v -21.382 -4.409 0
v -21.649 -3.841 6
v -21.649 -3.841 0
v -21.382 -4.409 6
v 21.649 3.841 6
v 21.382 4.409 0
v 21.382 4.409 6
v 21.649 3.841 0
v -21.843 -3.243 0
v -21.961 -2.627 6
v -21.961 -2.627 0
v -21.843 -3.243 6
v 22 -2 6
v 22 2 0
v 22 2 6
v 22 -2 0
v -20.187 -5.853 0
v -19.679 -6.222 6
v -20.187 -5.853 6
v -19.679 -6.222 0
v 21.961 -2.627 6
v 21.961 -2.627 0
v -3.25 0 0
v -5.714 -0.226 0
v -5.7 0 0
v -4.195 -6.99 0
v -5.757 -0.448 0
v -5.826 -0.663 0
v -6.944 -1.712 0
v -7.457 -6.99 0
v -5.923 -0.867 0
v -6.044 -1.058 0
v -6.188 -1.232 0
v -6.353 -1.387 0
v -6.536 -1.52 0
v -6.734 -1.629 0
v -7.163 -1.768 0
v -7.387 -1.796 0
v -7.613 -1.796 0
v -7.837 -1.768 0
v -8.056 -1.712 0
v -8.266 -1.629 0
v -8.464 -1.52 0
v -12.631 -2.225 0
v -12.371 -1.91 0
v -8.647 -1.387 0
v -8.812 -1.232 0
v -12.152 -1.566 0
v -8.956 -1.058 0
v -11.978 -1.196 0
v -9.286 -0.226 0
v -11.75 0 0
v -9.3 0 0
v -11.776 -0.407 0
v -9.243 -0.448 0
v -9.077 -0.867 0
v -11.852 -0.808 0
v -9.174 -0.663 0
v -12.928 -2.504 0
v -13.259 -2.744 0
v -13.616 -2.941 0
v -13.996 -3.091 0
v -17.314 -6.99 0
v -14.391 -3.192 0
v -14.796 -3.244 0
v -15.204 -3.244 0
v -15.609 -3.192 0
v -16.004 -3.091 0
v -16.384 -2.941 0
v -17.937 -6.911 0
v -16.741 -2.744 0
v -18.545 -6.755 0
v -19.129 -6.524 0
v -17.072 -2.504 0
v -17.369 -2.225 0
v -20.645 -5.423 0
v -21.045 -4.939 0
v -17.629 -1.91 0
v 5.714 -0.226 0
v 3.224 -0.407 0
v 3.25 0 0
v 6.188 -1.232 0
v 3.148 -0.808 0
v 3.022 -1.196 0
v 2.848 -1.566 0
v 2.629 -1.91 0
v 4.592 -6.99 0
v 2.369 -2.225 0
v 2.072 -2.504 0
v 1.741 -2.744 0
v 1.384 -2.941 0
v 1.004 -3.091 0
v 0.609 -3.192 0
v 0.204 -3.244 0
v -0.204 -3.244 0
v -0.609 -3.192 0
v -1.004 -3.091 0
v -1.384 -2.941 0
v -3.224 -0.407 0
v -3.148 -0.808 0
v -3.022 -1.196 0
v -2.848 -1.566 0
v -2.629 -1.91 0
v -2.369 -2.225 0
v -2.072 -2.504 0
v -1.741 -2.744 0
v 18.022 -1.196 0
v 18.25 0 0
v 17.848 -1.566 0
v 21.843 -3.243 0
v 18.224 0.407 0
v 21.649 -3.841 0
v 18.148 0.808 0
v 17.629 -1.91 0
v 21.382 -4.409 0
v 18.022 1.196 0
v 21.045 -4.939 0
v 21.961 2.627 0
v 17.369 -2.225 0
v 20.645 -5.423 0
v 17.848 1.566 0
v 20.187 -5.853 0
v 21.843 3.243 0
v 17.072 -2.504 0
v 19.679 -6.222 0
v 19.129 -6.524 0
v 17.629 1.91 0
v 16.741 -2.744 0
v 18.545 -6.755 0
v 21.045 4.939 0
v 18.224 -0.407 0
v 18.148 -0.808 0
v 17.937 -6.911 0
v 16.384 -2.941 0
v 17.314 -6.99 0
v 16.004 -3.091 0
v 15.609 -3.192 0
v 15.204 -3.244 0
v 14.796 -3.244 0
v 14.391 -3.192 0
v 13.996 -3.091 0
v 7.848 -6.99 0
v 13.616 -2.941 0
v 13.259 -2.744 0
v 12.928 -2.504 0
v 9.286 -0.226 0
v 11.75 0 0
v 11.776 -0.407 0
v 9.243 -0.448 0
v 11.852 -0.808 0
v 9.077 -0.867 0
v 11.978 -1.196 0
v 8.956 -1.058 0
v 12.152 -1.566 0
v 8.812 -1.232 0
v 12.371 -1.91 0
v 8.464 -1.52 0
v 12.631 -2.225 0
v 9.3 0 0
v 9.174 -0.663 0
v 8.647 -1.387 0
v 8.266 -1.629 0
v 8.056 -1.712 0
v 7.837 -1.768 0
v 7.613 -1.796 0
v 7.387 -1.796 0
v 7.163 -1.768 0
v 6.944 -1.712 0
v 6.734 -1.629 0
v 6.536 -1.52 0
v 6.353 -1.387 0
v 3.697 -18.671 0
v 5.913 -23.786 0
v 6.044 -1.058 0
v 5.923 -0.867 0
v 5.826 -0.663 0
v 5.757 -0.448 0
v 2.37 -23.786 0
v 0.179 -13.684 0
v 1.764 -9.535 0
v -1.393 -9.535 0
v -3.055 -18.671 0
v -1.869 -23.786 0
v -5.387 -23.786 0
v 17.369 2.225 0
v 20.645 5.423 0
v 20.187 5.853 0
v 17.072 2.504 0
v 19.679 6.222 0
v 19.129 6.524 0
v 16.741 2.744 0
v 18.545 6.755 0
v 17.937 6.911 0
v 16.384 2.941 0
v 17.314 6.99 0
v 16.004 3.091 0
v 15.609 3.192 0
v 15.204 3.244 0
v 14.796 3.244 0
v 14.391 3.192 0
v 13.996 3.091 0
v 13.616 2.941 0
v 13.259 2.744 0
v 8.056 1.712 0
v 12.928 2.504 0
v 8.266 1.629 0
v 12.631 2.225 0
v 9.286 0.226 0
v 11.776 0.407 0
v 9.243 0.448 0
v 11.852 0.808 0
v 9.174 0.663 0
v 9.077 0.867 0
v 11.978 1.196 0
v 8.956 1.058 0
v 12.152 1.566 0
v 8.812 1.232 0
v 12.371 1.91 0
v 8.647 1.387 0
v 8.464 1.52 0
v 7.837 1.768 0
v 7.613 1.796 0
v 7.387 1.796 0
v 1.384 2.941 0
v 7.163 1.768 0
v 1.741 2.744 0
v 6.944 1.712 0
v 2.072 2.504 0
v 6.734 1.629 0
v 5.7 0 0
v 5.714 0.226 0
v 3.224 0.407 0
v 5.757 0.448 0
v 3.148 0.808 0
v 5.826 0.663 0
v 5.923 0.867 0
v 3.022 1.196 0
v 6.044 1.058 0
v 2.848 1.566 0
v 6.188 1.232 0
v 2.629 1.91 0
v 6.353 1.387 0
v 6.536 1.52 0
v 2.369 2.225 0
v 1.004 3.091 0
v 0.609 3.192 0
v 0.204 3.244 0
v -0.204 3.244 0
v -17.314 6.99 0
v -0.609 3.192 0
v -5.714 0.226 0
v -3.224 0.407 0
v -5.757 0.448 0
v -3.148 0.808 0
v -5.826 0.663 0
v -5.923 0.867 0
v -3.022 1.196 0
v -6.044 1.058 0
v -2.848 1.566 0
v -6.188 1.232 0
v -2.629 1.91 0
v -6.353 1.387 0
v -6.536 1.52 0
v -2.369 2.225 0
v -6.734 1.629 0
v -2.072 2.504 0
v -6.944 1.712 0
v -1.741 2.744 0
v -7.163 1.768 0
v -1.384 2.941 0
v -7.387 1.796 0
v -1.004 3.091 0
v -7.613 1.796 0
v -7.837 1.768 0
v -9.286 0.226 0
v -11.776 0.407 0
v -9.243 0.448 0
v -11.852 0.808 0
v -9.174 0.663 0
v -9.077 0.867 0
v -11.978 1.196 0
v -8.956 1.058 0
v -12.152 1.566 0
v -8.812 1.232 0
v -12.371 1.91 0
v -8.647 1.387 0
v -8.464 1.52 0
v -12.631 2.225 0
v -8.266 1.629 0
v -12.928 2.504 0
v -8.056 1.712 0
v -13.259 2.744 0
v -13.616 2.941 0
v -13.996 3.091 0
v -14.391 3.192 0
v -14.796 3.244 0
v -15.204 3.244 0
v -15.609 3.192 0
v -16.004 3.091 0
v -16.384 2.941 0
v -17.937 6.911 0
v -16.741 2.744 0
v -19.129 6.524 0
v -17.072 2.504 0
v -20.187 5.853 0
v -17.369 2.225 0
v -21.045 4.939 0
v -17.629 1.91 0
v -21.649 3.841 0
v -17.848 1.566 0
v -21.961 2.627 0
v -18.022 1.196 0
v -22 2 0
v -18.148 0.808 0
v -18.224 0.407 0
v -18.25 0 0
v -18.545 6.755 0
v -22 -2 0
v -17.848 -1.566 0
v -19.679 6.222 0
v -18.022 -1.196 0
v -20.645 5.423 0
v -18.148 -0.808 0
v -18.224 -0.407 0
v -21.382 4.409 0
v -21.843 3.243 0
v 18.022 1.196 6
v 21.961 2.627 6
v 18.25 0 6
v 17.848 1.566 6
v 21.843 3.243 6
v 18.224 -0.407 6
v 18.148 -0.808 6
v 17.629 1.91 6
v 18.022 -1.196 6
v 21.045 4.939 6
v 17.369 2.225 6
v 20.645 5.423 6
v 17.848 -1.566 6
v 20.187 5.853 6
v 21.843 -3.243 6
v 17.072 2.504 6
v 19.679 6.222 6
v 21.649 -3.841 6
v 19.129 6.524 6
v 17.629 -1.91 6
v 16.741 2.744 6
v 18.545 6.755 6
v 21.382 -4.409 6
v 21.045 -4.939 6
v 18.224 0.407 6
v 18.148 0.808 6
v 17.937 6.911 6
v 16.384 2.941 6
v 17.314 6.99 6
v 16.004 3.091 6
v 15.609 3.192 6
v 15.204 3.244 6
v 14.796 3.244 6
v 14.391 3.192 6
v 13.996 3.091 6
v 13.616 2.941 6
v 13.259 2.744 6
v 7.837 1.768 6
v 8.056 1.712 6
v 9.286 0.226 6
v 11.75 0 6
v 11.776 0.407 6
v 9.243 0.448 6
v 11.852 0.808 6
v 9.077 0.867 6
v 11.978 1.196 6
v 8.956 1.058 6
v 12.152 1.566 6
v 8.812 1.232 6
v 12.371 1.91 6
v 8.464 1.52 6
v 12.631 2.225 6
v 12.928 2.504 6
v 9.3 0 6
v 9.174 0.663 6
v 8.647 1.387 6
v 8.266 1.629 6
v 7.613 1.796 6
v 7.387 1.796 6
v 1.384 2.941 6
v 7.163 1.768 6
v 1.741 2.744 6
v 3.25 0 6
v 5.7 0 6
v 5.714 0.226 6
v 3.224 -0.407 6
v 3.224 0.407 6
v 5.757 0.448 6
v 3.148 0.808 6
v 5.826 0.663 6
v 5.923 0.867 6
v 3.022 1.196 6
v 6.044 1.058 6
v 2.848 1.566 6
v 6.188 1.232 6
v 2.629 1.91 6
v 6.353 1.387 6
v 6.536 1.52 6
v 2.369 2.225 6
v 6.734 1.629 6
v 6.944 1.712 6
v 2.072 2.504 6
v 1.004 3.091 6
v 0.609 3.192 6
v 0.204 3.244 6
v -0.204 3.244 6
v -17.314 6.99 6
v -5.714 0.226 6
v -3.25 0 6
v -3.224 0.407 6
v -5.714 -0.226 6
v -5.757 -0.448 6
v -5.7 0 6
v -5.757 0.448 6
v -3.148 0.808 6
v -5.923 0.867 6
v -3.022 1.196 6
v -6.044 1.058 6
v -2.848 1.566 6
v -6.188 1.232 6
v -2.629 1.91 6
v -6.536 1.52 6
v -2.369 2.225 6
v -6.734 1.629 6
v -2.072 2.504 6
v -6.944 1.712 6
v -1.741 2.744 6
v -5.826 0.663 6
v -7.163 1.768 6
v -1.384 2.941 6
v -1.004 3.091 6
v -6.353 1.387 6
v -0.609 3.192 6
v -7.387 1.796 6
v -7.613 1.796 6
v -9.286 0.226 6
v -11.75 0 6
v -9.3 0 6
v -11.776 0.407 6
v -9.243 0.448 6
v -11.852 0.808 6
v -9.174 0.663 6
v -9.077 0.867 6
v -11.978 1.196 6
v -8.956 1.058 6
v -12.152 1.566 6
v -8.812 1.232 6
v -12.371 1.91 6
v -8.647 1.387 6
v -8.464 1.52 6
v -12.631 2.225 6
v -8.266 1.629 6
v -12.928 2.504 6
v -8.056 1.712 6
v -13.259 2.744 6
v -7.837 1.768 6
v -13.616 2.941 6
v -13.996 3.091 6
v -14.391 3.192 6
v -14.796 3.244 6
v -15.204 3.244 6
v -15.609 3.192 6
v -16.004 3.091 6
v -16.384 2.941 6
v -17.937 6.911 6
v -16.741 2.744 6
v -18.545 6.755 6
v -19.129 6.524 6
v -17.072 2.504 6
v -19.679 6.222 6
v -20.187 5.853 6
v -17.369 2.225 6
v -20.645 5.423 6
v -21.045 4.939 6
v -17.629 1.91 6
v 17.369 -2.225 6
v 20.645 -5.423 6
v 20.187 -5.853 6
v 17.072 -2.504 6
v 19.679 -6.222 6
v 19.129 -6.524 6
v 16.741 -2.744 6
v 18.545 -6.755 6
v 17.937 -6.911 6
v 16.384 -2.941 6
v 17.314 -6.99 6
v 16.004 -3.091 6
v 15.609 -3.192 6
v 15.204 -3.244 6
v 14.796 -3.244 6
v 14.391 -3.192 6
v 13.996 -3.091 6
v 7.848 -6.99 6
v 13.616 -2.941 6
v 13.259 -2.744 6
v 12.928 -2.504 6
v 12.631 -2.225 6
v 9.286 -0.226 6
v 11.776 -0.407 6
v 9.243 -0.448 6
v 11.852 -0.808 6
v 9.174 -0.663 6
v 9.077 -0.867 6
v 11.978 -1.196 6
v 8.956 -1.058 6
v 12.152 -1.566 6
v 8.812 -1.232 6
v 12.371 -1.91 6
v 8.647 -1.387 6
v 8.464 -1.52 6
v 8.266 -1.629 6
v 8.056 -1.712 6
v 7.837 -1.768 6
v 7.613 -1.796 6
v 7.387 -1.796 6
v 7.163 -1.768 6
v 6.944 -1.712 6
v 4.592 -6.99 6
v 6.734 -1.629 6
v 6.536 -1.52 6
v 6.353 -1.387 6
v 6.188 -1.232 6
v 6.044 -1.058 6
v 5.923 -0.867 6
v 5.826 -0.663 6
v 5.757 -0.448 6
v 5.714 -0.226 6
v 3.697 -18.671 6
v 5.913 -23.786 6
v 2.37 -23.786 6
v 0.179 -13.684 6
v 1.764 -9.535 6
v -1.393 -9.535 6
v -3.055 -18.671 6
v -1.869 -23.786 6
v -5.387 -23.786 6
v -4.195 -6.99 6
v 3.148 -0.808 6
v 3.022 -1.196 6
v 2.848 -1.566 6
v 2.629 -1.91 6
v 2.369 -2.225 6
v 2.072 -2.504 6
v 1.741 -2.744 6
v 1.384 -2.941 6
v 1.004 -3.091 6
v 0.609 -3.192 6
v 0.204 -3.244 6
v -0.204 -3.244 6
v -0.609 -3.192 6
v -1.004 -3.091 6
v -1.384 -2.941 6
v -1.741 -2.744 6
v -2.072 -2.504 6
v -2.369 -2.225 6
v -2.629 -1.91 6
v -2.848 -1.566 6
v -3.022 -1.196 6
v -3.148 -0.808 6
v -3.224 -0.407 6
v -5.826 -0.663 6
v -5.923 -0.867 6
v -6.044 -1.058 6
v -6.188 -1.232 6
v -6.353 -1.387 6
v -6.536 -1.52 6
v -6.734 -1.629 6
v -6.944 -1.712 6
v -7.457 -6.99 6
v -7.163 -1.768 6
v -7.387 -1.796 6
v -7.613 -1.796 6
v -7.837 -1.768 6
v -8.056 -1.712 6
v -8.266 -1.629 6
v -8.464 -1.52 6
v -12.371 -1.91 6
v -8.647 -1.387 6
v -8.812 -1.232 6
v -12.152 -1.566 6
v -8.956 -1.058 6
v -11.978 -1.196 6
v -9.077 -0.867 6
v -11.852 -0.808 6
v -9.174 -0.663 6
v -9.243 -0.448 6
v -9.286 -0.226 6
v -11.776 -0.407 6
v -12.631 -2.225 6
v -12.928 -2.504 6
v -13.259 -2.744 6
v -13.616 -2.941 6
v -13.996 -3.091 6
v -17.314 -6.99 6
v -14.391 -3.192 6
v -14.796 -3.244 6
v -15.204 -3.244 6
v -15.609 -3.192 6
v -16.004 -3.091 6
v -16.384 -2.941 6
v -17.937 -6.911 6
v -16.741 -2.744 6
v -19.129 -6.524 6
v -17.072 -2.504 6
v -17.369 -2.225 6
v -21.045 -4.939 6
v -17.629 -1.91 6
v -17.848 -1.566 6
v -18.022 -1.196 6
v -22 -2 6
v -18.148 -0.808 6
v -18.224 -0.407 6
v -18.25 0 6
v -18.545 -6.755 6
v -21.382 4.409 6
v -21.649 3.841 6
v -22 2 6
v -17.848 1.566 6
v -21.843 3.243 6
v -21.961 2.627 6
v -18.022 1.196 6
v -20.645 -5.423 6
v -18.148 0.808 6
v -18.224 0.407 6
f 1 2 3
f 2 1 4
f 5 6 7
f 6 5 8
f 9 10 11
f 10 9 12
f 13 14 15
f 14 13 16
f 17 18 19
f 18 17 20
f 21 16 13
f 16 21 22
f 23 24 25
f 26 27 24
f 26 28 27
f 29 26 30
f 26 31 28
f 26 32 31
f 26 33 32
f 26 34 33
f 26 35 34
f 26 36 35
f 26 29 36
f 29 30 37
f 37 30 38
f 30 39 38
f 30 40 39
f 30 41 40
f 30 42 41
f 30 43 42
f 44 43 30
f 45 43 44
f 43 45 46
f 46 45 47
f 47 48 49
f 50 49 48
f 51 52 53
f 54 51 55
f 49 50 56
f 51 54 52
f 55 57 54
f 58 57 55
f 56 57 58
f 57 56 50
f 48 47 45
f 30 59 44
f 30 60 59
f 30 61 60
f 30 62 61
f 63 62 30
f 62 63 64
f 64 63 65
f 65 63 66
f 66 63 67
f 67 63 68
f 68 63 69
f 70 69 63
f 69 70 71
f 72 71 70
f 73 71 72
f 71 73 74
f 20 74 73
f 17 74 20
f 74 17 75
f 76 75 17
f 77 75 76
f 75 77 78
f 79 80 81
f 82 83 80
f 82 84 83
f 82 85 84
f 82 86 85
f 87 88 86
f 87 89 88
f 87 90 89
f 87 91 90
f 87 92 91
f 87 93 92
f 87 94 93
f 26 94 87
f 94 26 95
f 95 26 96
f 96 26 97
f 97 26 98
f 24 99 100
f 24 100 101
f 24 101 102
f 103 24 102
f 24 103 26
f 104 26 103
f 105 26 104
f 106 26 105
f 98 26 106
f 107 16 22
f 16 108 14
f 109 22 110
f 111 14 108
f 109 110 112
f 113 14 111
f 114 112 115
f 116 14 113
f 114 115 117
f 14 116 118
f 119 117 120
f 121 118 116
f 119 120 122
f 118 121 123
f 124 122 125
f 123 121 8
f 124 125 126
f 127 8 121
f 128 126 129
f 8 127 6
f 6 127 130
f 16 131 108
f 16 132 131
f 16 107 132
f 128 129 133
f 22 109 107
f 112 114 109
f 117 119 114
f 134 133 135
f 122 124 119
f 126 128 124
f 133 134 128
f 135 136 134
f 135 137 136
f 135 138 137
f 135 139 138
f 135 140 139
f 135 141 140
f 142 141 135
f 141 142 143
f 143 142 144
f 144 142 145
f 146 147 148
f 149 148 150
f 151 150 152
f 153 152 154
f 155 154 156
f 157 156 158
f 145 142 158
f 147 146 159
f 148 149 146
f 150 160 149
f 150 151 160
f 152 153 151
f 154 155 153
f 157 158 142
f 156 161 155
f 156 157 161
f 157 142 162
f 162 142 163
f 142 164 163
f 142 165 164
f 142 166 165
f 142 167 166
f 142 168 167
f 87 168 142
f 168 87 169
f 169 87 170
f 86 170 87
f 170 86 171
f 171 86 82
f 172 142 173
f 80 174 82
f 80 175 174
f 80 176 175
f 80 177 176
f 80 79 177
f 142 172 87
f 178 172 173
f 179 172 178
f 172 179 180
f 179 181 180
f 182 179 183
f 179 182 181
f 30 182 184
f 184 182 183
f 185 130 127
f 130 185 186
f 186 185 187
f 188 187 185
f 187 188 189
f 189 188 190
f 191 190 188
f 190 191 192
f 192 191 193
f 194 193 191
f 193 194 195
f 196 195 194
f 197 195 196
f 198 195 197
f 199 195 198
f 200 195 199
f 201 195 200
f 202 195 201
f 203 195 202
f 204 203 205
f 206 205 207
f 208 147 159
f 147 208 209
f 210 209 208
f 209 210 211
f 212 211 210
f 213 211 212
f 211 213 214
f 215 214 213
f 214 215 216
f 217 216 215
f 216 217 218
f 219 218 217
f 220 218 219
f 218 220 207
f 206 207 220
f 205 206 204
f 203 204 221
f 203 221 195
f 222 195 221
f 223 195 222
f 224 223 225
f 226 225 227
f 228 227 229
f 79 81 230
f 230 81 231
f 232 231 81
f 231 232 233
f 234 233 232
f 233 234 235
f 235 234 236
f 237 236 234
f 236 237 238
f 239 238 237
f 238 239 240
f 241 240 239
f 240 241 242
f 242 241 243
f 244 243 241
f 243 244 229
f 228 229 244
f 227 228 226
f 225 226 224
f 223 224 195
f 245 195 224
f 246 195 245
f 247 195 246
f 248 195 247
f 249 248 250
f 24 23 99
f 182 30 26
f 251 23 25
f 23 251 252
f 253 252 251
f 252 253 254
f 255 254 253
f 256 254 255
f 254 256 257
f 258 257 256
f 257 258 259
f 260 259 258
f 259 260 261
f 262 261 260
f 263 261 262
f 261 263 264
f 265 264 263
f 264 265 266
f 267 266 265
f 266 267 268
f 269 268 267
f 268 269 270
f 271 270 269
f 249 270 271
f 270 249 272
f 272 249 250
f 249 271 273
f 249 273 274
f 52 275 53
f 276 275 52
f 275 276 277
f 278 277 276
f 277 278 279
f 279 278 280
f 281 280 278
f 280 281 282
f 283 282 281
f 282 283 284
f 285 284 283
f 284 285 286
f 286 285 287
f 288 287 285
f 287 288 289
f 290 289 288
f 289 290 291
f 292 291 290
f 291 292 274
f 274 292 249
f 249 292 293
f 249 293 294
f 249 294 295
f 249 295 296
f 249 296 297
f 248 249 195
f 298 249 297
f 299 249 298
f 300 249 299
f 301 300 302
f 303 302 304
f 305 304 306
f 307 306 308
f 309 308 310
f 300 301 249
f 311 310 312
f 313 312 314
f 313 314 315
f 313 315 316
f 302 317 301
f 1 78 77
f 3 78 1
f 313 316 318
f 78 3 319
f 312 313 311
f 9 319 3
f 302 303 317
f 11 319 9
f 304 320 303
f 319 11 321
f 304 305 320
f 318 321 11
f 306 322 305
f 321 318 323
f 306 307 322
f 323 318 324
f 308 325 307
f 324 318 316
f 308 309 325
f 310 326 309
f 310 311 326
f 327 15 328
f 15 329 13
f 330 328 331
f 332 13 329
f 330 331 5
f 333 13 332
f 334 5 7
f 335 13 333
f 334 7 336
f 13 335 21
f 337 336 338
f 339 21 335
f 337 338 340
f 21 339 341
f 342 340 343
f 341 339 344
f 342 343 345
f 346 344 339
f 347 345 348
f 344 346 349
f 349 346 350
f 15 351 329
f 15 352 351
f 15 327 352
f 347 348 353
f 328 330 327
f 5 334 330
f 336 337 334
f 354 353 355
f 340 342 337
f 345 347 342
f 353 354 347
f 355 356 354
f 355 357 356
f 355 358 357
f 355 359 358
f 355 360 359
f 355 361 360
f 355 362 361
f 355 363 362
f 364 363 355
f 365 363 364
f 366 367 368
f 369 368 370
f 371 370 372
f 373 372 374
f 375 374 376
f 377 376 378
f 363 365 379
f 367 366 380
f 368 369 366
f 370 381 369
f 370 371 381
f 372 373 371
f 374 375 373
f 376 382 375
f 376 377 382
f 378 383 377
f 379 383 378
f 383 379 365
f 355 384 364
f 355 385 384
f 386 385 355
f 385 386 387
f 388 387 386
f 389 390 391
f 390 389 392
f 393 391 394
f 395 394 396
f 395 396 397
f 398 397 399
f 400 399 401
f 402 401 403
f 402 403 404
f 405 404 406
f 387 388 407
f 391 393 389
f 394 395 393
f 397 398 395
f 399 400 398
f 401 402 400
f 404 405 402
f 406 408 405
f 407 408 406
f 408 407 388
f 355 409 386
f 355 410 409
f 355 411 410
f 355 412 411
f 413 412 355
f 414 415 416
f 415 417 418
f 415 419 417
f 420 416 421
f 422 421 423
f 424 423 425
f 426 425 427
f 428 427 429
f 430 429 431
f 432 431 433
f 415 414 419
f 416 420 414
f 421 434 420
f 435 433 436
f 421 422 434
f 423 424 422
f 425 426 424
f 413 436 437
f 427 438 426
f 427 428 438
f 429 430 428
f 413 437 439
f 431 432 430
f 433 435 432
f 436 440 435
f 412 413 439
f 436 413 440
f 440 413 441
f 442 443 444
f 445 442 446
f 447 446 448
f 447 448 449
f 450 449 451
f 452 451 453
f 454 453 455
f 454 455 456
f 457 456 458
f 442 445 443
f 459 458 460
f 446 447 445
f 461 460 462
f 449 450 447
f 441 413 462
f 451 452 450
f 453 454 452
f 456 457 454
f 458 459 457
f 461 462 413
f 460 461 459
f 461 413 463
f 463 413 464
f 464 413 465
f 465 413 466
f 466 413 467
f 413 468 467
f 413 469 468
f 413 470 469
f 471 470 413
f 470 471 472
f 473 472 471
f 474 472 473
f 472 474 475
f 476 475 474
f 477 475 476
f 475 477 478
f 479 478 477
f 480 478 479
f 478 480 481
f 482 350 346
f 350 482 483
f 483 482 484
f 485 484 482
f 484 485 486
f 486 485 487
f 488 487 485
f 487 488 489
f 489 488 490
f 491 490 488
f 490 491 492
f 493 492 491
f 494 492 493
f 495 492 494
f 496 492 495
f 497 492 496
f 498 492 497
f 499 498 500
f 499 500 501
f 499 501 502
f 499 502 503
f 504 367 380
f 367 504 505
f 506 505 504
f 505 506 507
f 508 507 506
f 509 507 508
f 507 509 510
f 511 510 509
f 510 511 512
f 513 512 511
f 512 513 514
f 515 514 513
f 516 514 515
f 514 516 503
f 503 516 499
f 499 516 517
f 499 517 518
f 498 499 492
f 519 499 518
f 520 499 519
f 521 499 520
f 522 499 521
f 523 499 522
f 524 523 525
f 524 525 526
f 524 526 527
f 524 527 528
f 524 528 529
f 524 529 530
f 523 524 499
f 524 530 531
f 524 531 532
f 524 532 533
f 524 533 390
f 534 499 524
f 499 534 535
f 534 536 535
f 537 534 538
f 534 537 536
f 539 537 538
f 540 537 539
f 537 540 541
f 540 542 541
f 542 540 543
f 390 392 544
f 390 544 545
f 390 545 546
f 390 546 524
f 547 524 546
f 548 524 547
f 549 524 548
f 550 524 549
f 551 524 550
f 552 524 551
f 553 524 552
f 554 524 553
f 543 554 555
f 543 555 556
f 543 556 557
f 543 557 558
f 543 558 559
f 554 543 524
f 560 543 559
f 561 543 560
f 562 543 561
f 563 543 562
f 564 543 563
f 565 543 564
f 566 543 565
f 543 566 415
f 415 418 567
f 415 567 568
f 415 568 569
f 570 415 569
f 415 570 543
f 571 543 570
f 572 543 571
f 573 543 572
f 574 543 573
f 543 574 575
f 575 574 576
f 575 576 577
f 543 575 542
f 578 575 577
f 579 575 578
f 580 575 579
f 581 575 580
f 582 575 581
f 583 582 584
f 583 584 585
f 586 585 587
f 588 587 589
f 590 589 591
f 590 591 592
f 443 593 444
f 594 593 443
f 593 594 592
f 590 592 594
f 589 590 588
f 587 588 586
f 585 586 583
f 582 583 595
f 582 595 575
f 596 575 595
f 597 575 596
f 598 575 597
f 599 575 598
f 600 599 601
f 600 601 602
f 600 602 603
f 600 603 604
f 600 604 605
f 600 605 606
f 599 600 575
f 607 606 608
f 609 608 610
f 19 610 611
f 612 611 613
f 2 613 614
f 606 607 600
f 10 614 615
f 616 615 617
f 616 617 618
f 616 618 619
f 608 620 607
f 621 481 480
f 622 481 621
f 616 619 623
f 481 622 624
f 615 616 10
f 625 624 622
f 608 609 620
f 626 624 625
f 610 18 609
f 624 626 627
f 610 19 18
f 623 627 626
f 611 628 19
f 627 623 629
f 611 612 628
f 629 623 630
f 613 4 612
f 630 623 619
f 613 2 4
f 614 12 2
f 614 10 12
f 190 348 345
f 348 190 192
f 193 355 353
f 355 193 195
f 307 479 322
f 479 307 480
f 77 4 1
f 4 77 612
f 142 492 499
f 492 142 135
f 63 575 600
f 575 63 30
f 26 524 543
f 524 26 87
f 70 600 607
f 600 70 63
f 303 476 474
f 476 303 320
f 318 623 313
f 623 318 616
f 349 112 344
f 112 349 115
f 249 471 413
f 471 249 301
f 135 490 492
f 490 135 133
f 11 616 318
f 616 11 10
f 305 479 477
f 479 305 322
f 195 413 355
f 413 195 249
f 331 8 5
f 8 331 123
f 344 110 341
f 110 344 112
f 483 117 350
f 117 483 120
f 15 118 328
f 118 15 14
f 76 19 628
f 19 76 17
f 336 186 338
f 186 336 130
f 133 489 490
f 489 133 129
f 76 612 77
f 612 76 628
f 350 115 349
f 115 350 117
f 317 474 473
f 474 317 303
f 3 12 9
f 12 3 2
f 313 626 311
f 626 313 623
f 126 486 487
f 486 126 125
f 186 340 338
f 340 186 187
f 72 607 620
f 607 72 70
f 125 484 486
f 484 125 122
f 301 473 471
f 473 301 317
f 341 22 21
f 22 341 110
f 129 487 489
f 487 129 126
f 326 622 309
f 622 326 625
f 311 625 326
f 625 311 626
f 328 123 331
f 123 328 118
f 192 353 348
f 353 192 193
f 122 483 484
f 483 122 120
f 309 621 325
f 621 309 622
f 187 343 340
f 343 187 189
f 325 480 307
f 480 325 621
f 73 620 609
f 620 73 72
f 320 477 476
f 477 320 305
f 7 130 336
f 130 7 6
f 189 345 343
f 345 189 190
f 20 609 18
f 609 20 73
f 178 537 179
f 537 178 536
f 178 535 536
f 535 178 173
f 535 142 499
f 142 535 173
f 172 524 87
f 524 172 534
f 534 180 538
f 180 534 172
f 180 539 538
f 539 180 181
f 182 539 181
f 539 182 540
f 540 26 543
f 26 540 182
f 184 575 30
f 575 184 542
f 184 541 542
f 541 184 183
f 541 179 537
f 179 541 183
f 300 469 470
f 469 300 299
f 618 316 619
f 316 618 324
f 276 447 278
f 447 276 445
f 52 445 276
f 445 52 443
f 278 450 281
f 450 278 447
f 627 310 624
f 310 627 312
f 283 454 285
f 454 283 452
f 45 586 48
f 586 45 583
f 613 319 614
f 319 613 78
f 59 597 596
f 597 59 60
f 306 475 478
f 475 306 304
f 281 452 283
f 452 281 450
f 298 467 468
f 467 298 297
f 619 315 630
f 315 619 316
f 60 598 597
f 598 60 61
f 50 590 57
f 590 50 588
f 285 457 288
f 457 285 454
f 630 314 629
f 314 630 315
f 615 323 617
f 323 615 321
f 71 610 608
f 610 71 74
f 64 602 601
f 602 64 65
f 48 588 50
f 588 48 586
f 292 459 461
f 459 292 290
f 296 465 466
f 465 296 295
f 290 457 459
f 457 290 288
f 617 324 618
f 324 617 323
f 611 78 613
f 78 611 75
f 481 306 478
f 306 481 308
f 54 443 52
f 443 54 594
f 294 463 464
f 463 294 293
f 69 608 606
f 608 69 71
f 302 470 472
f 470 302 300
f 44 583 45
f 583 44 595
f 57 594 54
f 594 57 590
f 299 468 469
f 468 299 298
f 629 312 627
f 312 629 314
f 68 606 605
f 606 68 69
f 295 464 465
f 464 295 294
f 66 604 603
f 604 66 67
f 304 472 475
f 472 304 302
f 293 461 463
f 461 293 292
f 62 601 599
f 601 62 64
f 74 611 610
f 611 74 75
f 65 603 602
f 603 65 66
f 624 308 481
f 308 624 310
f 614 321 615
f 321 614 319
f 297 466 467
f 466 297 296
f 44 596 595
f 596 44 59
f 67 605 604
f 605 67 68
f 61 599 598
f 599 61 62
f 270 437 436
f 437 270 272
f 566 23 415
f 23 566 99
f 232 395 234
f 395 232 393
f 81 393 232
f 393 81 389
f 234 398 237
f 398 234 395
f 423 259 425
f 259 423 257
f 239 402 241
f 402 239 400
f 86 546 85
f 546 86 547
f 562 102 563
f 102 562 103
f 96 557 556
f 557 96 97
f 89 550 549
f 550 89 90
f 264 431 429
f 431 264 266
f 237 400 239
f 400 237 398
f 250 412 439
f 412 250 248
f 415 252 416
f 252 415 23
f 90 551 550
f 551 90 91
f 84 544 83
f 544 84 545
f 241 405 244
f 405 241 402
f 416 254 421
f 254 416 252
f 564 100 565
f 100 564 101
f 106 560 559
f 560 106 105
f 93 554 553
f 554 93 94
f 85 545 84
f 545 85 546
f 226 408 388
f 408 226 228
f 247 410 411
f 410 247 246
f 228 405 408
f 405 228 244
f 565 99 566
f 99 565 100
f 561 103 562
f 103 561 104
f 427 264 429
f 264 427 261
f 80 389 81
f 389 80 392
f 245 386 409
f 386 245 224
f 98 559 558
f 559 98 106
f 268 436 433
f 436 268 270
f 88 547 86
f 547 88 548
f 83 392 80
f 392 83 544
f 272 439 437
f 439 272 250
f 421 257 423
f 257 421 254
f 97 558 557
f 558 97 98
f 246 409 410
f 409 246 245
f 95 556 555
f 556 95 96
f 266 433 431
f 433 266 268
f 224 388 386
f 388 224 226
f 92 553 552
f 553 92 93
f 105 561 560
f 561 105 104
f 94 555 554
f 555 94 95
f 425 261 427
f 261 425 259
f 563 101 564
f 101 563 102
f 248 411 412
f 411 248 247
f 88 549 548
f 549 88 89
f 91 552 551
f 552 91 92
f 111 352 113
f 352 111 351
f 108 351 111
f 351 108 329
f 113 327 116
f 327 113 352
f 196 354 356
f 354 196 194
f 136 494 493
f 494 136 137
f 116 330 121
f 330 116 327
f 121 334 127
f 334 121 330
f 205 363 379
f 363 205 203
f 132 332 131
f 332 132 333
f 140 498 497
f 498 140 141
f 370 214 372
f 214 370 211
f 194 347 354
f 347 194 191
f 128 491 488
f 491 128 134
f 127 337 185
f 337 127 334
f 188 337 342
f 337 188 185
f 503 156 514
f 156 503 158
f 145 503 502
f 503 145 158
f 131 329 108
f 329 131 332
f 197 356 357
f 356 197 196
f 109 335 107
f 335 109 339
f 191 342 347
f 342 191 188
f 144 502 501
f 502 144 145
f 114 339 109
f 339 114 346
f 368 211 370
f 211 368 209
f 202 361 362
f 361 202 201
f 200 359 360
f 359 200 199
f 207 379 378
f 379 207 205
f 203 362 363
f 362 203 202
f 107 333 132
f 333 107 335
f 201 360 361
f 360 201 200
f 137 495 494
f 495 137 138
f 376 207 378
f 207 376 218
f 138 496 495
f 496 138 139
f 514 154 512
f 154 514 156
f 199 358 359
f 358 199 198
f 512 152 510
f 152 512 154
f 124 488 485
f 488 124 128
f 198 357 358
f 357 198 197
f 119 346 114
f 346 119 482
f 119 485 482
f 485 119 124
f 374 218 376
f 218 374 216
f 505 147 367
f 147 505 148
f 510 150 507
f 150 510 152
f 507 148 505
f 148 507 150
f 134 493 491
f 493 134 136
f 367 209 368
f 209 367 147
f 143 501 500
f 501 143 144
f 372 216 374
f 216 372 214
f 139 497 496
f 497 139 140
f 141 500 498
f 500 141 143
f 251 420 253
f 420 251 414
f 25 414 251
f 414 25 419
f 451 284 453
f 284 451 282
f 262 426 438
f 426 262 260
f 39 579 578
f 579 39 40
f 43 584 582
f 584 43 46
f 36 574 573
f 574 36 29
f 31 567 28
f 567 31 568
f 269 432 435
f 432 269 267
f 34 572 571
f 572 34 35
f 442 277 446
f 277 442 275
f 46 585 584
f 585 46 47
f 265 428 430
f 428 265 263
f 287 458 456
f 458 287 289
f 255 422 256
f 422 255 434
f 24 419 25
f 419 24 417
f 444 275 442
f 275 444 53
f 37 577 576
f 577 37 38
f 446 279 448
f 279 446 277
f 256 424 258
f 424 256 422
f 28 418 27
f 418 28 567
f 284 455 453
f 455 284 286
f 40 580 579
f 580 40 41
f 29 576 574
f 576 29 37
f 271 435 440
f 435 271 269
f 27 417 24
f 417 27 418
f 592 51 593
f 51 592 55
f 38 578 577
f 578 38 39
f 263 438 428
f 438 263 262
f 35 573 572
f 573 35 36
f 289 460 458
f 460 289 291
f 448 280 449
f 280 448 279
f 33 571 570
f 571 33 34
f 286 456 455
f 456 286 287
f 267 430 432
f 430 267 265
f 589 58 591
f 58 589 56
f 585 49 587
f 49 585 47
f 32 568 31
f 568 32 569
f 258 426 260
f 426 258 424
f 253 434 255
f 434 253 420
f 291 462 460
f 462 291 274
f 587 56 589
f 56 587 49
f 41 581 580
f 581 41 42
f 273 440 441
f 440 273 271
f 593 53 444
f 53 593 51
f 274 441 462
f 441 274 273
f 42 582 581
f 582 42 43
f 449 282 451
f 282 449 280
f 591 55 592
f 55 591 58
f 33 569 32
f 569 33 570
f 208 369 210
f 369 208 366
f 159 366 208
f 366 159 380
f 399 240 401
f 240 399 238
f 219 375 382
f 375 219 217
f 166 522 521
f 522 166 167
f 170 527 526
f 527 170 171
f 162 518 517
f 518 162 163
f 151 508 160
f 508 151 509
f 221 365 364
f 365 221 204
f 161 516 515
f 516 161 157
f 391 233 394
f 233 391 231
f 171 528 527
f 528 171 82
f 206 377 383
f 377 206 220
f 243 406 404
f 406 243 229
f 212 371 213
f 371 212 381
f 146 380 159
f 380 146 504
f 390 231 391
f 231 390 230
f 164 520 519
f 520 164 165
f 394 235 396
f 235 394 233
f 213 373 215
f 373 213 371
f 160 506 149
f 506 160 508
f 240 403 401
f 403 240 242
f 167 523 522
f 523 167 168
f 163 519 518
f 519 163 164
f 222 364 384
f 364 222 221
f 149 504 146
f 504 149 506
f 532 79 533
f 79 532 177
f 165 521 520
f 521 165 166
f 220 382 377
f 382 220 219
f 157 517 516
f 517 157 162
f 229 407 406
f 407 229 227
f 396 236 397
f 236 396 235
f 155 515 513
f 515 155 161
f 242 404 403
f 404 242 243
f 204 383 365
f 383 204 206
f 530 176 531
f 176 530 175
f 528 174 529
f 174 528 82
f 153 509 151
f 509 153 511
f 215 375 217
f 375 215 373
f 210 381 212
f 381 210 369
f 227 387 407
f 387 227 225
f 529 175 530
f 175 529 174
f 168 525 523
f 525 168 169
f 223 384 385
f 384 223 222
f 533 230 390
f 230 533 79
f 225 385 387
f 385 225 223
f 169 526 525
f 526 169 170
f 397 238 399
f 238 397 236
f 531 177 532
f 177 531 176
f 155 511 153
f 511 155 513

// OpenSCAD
$fn = 50;


difference() {
	union() {
		hull() {
			translate(v = [-17.0000000000, 2.0000000000, 0]) {
				cylinder(h = 6, r = 5);
			}
			translate(v = [17.0000000000, 2.0000000000, 0]) {
				cylinder(h = 6, r = 5);
			}
			translate(v = [-17.0000000000, -2.0000000000, 0]) {
				cylinder(h = 6, r = 5);
			}
			translate(v = [17.0000000000, -2.0000000000, 0]) {
				cylinder(h = 6, r = 5);
			}
		}
		translate(v = [0, -5, 0]) {
			linear_extrude(height = 6) {
				text(font = "DejaVu Sans Mono:style=Bold", halign = "center", size = 19.0000000000, text = "W", valign = "top");
			}
		}
	}
	union() {
		translate(v = [-15.0000000000, 0.0000000000, 0]) {
			translate(v = [0, 0, -100]) {
				cylinder(h = 200, r = 3.2500000000);
			}
		}
		translate(v = [0, 0, -100]) {
			cylinder(h = 200, r = 3.2500000000);
		}
		translate(v = [15.0000000000, 0.0000000000, 0]) {
			translate(v = [0, 0, -100]) {
				cylinder(h = 200, r = 3.2500000000);
			}
		}
		translate(v = [-15.0000000000, 0.0000000000, 0]) {
			translate(v = [0, 0, -100]) {
				cylinder(h = 200, r = 1.8000000000);
			}
		}
		translate(v = [-7.5000000000, 0.0000000000, 0]) {
			translate(v = [0, 0, -100]) {
				cylinder(h = 200, r = 1.8000000000);
			}
		}
		translate(v = [0, 0, -100]) {
			cylinder(h = 200, r = 1.8000000000);
		}
		translate(v = [7.5000000000, 0.0000000000, 0]) {
			translate(v = [0, 0, -100]) {
				cylinder(h = 200, r = 1.8000000000);
			}
		}
		translate(v = [15.0000000000, 0.0000000000, 0]) {
			translate(v = [0, 0, -100]) {
				cylinder(h = 200, r = 1.8000000000);
			}
		}
	}
}
